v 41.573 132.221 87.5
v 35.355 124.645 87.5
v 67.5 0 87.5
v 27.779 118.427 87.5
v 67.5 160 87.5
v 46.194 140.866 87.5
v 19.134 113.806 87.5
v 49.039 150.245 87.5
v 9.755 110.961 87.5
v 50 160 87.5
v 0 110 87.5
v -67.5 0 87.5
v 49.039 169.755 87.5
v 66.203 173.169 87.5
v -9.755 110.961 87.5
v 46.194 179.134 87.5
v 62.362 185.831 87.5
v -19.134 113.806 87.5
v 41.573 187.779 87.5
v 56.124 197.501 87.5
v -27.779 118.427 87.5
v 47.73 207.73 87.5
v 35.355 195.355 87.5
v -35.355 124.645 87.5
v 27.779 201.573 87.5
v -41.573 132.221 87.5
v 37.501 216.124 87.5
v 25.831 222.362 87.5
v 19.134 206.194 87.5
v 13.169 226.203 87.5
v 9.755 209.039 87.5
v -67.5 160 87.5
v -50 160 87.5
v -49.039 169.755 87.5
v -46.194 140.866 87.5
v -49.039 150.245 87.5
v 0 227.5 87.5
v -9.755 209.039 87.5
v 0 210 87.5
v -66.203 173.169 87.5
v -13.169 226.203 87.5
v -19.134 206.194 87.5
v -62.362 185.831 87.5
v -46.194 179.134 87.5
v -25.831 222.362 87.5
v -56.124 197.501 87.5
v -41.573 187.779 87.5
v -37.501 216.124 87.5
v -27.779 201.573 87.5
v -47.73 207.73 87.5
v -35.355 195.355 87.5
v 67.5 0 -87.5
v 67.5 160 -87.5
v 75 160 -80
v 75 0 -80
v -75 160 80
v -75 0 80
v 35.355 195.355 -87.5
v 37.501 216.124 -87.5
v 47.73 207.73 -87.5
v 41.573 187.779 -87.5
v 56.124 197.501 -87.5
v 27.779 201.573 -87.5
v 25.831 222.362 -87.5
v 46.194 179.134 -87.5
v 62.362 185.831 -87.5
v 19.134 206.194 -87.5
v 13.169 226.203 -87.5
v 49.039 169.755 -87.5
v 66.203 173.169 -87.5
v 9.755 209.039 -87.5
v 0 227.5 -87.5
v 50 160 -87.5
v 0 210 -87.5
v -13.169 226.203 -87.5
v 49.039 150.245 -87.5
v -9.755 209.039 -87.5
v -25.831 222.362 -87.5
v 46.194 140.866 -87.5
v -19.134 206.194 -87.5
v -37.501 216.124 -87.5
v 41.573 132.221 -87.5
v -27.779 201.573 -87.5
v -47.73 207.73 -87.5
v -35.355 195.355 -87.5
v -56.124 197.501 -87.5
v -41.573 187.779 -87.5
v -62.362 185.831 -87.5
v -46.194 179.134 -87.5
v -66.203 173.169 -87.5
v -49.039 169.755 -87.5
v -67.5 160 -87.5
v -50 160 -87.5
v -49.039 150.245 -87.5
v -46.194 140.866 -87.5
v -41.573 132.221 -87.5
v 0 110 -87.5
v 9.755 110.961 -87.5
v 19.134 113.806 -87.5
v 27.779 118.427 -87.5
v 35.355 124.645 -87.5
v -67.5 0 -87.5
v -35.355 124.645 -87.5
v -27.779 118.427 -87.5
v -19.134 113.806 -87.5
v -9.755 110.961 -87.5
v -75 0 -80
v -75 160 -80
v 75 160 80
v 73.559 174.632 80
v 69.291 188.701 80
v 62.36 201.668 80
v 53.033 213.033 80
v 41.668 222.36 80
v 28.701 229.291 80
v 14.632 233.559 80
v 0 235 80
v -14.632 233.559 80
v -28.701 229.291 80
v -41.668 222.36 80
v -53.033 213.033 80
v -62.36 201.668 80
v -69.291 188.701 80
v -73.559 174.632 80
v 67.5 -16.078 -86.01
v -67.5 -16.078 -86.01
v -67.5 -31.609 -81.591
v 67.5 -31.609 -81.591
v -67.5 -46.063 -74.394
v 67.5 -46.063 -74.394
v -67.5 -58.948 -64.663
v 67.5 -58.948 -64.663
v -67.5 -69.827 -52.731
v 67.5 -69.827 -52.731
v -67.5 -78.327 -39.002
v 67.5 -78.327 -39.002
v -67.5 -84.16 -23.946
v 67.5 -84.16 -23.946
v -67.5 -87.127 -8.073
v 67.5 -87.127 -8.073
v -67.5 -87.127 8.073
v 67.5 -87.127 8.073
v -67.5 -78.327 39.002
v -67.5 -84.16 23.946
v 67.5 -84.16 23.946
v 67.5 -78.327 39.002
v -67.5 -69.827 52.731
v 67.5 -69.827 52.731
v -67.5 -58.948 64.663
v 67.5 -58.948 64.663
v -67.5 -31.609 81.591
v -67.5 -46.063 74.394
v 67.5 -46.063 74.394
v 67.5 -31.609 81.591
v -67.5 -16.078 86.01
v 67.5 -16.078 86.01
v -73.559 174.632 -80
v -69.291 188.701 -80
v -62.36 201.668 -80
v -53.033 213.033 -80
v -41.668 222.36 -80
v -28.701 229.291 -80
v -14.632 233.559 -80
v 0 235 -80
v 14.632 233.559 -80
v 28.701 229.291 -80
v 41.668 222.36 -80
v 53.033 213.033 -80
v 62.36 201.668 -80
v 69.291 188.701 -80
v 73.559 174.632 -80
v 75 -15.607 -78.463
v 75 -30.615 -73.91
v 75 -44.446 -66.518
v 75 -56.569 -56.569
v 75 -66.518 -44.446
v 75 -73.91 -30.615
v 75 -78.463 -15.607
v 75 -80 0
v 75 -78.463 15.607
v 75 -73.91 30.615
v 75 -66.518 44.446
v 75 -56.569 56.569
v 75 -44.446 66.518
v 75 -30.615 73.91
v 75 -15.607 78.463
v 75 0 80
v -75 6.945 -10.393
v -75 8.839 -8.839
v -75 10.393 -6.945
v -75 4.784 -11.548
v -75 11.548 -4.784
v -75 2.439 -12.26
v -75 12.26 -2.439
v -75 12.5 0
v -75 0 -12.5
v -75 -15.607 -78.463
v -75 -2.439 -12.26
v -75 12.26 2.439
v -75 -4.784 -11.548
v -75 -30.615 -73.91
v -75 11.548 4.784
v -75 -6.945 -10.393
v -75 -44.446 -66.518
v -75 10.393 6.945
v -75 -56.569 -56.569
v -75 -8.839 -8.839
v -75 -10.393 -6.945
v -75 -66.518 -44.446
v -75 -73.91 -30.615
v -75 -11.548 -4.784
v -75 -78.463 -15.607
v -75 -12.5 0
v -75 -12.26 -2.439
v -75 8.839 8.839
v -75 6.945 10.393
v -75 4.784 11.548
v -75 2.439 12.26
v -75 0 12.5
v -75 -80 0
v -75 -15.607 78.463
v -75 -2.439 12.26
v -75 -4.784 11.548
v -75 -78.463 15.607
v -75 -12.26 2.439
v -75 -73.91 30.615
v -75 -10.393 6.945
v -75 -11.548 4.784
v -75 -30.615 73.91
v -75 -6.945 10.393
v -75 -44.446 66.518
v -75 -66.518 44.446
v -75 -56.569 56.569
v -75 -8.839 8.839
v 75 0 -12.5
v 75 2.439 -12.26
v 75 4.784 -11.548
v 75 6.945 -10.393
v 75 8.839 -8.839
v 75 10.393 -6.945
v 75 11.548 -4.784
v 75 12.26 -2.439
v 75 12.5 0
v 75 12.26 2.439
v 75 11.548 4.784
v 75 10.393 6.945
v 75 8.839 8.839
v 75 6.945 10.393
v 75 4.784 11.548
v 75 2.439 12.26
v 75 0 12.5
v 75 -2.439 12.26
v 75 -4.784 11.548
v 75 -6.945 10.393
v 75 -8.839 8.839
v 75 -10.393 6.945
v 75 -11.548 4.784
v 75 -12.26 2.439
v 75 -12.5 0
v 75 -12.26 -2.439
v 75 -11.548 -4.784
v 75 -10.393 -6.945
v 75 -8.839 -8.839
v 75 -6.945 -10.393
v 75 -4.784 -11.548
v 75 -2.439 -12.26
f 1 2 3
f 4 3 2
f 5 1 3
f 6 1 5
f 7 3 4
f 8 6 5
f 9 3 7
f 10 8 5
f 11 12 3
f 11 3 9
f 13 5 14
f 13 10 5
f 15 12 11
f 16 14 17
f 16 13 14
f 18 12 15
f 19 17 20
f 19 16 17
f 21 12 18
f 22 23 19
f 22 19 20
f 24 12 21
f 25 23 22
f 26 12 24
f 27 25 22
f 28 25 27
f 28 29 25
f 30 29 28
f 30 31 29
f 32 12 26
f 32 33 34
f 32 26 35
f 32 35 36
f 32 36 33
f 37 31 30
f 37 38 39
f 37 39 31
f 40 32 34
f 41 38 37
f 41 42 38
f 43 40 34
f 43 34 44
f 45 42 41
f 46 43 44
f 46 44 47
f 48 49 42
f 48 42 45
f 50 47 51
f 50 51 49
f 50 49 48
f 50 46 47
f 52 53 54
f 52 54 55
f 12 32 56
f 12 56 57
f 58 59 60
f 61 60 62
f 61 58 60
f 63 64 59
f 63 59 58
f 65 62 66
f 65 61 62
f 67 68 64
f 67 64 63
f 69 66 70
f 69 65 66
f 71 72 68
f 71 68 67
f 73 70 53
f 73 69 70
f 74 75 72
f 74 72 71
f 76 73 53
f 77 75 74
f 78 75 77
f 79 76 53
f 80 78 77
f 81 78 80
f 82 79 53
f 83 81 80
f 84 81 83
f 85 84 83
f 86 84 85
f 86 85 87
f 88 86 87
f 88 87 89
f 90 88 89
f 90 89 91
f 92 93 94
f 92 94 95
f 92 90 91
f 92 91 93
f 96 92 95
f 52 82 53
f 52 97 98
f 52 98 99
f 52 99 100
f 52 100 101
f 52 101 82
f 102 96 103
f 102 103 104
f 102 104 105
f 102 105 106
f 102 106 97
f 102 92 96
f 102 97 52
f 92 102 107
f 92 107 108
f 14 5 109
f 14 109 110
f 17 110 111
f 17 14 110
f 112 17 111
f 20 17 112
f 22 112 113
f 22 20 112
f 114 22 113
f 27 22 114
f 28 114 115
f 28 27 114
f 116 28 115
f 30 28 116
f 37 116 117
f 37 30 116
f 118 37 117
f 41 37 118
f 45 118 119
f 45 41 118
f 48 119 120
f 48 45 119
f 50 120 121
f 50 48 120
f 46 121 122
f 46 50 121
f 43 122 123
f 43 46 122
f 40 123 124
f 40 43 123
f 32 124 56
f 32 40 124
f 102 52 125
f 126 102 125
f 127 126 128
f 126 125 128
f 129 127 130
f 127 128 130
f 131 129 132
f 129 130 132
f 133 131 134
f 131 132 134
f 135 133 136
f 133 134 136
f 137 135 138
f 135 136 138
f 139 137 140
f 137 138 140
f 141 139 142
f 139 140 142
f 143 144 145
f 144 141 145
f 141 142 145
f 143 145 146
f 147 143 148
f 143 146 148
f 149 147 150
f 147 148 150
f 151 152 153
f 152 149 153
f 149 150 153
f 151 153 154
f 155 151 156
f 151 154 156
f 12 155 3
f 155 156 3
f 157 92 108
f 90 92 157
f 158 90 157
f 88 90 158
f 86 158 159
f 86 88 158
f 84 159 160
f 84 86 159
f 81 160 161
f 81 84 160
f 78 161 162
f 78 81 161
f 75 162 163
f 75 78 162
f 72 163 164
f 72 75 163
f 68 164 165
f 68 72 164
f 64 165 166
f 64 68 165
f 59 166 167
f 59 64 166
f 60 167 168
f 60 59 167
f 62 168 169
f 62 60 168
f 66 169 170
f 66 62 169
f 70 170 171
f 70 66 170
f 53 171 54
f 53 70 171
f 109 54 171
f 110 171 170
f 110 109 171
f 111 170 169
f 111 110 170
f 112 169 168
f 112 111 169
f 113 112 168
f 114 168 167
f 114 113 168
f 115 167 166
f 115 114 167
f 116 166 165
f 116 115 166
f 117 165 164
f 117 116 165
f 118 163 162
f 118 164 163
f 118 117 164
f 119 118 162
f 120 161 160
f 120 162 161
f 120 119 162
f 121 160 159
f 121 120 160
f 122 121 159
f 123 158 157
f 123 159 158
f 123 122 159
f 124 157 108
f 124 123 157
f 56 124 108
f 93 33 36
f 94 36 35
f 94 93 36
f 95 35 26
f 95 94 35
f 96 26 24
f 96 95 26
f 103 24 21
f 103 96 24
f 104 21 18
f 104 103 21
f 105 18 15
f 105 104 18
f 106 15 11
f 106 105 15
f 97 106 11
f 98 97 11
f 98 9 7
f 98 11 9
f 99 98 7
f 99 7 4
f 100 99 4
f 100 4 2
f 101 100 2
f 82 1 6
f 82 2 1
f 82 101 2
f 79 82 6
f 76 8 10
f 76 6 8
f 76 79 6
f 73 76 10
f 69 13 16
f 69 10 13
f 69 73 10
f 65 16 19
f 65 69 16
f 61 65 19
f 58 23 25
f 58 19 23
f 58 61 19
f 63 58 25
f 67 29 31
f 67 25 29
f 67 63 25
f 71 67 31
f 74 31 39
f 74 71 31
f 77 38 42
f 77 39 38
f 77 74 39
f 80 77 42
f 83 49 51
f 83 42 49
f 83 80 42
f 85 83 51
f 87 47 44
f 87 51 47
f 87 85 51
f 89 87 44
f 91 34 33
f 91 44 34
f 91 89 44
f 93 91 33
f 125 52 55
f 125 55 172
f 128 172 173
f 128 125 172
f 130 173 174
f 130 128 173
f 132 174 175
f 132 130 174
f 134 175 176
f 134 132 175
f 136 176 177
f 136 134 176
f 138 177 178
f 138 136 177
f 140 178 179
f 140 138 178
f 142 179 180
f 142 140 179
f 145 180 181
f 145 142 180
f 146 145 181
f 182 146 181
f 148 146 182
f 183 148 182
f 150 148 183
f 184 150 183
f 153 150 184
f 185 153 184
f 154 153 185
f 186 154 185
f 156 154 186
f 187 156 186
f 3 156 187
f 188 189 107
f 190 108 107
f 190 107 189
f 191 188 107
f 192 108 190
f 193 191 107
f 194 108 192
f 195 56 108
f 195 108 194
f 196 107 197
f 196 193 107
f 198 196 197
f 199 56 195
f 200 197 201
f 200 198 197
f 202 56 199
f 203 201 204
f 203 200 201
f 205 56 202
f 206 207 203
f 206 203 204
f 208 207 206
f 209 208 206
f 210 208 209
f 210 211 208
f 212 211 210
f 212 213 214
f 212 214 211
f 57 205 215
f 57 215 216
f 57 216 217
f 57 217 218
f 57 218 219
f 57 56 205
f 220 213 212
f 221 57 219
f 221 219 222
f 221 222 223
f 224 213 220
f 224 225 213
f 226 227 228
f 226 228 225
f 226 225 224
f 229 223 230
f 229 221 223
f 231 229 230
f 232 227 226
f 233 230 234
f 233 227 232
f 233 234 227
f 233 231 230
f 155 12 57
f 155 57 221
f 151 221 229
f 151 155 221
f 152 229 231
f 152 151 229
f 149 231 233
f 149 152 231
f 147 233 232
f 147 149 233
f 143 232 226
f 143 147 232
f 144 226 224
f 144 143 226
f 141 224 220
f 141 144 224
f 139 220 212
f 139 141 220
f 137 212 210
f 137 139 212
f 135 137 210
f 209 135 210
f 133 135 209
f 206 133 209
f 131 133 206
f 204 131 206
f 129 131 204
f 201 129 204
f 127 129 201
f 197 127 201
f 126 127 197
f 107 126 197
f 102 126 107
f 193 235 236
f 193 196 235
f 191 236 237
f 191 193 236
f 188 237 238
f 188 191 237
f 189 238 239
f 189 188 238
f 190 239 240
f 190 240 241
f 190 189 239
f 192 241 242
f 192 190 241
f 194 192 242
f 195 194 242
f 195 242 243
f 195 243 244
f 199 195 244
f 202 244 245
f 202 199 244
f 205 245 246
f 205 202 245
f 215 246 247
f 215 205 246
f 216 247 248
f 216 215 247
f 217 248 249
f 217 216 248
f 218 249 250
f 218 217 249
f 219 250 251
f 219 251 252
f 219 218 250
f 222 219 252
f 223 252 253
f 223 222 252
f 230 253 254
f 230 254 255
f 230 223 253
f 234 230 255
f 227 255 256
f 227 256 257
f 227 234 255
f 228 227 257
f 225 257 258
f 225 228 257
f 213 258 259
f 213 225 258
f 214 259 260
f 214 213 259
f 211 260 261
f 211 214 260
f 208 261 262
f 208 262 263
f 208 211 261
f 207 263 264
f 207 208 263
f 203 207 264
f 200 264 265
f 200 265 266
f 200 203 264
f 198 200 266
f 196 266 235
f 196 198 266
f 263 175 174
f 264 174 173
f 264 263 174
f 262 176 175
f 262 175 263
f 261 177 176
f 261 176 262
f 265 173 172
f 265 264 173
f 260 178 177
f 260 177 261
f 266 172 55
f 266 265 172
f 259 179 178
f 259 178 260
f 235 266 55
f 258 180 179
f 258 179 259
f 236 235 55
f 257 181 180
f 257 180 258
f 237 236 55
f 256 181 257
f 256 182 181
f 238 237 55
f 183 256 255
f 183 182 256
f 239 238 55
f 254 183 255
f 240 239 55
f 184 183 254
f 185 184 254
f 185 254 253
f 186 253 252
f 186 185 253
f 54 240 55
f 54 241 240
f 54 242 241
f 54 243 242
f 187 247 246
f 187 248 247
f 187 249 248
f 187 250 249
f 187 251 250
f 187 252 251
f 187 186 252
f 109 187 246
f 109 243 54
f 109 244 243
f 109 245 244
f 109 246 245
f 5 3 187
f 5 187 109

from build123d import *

# Parameters (mm, degrees)
SKETCH1_R                       = 12.5
BOSS_EXTRUDE1_DEPTH             = 75
BOSS_EXTRUDE2_REACH             = 161.315
SKETCH2_R                       = 50
BOSS_EXTRUDE2_DIRECTION_2_REACH = 161.315
CHAMFER1_SIZE                   = 7.5


with BuildPart() as part:
    # Sketch1 → Boss-Extrude1 (new, symmetric)
    with BuildSketch(Plane(origin=(0, 0, 0), x_dir=(0, 0, -1), z_dir=(1, 0, 0))):
        with BuildLine():
            Line((-87.5, 0), (-87.5, 110))
            Line((-87.5, 110), (87.5, 110))
            Line((87.5, 110), (87.5, 0))
            ThreePointArc((87.5, 0), (0, -87.5), (-87.5, 0))
        make_face()
        Circle(SKETCH1_R, mode=Mode.SUBTRACT)
    extrude(amount=BOSS_EXTRUDE1_DEPTH, both=True)

    # Boss-Extrude2: up to this face of the body (flat: up to its plane)
    boss_extrude2_end = Plane(part.part.faces().sort_by_distance((0, 55, 87.5))[0])
    # Sketch2 → Boss-Extrude2 (add, up to the picked face)
    with BuildSketch(Plane.XY, mode=Mode.PRIVATE) as boss_extrude2_sk1:
        with BuildLine():
            Line((-75, 160), (-75, 85))
            Line((-75, 85), (75, 85))
            Line((75, 85), (75, 160))
            ThreePointArc((75, 160), (0, 235), (-75, 160))
        make_face()
        with Locations(Location((0, 160, 0), (0, 0, 180))):
            Circle(SKETCH2_R, mode=Mode.SUBTRACT)
    boss_extrude2_tool1 = split(extrude(boss_extrude2_sk1.sketch, amount=BOSS_EXTRUDE2_REACH, mode=Mode.PRIVATE), bisect_by=boss_extrude2_end, keep=Keep.BOTH, mode=Mode.PRIVATE)
    add(boss_extrude2_tool1.solids().sort_by(Axis((-72.87868, 122.5, 0), (0, 0, 1)))[0])

    # Boss-Extrude2 direction 2: up to this face of the body (flat: up to its plane)
    boss_extrude2_direction_2_end = Plane(part.part.faces().sort_by_distance((0, 55, -87.5))[0])
    # Sketch2 → Boss-Extrude2 direction 2 (add, up to the picked face)
    with BuildSketch(Plane.XY, mode=Mode.PRIVATE) as boss_extrude2_direction_2_sk1:
        with BuildLine():
            Line((-75, 160), (-75, 85))
            Line((-75, 85), (75, 85))
            Line((75, 85), (75, 160))
            ThreePointArc((75, 160), (0, 235), (-75, 160))
        make_face()
        with Locations(Location((0, 160, 0), (0, 0, 180))):
            Circle(SKETCH2_R, mode=Mode.SUBTRACT)
    boss_extrude2_direction_2_tool1 = split(extrude(boss_extrude2_direction_2_sk1.sketch, amount=-BOSS_EXTRUDE2_DIRECTION_2_REACH, mode=Mode.PRIVATE), bisect_by=boss_extrude2_direction_2_end, keep=Keep.BOTH, mode=Mode.PRIVATE)
    add(boss_extrude2_direction_2_tool1.solids().sort_by(Axis((-72.87868, 122.5, 0), (0, 0, -1)))[0])

    # Chamfer1
    chamfer1_edges = [part.edges().sort_by_distance(p)[0] for p in [
        (75, 80, 87.5),
        (0, 235, -87.5),
        (0, 235, 87.5),
        (75, -87.5, 0),
        (-75, 80, 87.5),
        (-75, 80, -87.5),
        (-75, -87.5, 0),
        (75, 80, -87.5),
    ]]
    chamfer(chamfer1_edges, length=CHAMFER1_SIZE)


solid = part.part
